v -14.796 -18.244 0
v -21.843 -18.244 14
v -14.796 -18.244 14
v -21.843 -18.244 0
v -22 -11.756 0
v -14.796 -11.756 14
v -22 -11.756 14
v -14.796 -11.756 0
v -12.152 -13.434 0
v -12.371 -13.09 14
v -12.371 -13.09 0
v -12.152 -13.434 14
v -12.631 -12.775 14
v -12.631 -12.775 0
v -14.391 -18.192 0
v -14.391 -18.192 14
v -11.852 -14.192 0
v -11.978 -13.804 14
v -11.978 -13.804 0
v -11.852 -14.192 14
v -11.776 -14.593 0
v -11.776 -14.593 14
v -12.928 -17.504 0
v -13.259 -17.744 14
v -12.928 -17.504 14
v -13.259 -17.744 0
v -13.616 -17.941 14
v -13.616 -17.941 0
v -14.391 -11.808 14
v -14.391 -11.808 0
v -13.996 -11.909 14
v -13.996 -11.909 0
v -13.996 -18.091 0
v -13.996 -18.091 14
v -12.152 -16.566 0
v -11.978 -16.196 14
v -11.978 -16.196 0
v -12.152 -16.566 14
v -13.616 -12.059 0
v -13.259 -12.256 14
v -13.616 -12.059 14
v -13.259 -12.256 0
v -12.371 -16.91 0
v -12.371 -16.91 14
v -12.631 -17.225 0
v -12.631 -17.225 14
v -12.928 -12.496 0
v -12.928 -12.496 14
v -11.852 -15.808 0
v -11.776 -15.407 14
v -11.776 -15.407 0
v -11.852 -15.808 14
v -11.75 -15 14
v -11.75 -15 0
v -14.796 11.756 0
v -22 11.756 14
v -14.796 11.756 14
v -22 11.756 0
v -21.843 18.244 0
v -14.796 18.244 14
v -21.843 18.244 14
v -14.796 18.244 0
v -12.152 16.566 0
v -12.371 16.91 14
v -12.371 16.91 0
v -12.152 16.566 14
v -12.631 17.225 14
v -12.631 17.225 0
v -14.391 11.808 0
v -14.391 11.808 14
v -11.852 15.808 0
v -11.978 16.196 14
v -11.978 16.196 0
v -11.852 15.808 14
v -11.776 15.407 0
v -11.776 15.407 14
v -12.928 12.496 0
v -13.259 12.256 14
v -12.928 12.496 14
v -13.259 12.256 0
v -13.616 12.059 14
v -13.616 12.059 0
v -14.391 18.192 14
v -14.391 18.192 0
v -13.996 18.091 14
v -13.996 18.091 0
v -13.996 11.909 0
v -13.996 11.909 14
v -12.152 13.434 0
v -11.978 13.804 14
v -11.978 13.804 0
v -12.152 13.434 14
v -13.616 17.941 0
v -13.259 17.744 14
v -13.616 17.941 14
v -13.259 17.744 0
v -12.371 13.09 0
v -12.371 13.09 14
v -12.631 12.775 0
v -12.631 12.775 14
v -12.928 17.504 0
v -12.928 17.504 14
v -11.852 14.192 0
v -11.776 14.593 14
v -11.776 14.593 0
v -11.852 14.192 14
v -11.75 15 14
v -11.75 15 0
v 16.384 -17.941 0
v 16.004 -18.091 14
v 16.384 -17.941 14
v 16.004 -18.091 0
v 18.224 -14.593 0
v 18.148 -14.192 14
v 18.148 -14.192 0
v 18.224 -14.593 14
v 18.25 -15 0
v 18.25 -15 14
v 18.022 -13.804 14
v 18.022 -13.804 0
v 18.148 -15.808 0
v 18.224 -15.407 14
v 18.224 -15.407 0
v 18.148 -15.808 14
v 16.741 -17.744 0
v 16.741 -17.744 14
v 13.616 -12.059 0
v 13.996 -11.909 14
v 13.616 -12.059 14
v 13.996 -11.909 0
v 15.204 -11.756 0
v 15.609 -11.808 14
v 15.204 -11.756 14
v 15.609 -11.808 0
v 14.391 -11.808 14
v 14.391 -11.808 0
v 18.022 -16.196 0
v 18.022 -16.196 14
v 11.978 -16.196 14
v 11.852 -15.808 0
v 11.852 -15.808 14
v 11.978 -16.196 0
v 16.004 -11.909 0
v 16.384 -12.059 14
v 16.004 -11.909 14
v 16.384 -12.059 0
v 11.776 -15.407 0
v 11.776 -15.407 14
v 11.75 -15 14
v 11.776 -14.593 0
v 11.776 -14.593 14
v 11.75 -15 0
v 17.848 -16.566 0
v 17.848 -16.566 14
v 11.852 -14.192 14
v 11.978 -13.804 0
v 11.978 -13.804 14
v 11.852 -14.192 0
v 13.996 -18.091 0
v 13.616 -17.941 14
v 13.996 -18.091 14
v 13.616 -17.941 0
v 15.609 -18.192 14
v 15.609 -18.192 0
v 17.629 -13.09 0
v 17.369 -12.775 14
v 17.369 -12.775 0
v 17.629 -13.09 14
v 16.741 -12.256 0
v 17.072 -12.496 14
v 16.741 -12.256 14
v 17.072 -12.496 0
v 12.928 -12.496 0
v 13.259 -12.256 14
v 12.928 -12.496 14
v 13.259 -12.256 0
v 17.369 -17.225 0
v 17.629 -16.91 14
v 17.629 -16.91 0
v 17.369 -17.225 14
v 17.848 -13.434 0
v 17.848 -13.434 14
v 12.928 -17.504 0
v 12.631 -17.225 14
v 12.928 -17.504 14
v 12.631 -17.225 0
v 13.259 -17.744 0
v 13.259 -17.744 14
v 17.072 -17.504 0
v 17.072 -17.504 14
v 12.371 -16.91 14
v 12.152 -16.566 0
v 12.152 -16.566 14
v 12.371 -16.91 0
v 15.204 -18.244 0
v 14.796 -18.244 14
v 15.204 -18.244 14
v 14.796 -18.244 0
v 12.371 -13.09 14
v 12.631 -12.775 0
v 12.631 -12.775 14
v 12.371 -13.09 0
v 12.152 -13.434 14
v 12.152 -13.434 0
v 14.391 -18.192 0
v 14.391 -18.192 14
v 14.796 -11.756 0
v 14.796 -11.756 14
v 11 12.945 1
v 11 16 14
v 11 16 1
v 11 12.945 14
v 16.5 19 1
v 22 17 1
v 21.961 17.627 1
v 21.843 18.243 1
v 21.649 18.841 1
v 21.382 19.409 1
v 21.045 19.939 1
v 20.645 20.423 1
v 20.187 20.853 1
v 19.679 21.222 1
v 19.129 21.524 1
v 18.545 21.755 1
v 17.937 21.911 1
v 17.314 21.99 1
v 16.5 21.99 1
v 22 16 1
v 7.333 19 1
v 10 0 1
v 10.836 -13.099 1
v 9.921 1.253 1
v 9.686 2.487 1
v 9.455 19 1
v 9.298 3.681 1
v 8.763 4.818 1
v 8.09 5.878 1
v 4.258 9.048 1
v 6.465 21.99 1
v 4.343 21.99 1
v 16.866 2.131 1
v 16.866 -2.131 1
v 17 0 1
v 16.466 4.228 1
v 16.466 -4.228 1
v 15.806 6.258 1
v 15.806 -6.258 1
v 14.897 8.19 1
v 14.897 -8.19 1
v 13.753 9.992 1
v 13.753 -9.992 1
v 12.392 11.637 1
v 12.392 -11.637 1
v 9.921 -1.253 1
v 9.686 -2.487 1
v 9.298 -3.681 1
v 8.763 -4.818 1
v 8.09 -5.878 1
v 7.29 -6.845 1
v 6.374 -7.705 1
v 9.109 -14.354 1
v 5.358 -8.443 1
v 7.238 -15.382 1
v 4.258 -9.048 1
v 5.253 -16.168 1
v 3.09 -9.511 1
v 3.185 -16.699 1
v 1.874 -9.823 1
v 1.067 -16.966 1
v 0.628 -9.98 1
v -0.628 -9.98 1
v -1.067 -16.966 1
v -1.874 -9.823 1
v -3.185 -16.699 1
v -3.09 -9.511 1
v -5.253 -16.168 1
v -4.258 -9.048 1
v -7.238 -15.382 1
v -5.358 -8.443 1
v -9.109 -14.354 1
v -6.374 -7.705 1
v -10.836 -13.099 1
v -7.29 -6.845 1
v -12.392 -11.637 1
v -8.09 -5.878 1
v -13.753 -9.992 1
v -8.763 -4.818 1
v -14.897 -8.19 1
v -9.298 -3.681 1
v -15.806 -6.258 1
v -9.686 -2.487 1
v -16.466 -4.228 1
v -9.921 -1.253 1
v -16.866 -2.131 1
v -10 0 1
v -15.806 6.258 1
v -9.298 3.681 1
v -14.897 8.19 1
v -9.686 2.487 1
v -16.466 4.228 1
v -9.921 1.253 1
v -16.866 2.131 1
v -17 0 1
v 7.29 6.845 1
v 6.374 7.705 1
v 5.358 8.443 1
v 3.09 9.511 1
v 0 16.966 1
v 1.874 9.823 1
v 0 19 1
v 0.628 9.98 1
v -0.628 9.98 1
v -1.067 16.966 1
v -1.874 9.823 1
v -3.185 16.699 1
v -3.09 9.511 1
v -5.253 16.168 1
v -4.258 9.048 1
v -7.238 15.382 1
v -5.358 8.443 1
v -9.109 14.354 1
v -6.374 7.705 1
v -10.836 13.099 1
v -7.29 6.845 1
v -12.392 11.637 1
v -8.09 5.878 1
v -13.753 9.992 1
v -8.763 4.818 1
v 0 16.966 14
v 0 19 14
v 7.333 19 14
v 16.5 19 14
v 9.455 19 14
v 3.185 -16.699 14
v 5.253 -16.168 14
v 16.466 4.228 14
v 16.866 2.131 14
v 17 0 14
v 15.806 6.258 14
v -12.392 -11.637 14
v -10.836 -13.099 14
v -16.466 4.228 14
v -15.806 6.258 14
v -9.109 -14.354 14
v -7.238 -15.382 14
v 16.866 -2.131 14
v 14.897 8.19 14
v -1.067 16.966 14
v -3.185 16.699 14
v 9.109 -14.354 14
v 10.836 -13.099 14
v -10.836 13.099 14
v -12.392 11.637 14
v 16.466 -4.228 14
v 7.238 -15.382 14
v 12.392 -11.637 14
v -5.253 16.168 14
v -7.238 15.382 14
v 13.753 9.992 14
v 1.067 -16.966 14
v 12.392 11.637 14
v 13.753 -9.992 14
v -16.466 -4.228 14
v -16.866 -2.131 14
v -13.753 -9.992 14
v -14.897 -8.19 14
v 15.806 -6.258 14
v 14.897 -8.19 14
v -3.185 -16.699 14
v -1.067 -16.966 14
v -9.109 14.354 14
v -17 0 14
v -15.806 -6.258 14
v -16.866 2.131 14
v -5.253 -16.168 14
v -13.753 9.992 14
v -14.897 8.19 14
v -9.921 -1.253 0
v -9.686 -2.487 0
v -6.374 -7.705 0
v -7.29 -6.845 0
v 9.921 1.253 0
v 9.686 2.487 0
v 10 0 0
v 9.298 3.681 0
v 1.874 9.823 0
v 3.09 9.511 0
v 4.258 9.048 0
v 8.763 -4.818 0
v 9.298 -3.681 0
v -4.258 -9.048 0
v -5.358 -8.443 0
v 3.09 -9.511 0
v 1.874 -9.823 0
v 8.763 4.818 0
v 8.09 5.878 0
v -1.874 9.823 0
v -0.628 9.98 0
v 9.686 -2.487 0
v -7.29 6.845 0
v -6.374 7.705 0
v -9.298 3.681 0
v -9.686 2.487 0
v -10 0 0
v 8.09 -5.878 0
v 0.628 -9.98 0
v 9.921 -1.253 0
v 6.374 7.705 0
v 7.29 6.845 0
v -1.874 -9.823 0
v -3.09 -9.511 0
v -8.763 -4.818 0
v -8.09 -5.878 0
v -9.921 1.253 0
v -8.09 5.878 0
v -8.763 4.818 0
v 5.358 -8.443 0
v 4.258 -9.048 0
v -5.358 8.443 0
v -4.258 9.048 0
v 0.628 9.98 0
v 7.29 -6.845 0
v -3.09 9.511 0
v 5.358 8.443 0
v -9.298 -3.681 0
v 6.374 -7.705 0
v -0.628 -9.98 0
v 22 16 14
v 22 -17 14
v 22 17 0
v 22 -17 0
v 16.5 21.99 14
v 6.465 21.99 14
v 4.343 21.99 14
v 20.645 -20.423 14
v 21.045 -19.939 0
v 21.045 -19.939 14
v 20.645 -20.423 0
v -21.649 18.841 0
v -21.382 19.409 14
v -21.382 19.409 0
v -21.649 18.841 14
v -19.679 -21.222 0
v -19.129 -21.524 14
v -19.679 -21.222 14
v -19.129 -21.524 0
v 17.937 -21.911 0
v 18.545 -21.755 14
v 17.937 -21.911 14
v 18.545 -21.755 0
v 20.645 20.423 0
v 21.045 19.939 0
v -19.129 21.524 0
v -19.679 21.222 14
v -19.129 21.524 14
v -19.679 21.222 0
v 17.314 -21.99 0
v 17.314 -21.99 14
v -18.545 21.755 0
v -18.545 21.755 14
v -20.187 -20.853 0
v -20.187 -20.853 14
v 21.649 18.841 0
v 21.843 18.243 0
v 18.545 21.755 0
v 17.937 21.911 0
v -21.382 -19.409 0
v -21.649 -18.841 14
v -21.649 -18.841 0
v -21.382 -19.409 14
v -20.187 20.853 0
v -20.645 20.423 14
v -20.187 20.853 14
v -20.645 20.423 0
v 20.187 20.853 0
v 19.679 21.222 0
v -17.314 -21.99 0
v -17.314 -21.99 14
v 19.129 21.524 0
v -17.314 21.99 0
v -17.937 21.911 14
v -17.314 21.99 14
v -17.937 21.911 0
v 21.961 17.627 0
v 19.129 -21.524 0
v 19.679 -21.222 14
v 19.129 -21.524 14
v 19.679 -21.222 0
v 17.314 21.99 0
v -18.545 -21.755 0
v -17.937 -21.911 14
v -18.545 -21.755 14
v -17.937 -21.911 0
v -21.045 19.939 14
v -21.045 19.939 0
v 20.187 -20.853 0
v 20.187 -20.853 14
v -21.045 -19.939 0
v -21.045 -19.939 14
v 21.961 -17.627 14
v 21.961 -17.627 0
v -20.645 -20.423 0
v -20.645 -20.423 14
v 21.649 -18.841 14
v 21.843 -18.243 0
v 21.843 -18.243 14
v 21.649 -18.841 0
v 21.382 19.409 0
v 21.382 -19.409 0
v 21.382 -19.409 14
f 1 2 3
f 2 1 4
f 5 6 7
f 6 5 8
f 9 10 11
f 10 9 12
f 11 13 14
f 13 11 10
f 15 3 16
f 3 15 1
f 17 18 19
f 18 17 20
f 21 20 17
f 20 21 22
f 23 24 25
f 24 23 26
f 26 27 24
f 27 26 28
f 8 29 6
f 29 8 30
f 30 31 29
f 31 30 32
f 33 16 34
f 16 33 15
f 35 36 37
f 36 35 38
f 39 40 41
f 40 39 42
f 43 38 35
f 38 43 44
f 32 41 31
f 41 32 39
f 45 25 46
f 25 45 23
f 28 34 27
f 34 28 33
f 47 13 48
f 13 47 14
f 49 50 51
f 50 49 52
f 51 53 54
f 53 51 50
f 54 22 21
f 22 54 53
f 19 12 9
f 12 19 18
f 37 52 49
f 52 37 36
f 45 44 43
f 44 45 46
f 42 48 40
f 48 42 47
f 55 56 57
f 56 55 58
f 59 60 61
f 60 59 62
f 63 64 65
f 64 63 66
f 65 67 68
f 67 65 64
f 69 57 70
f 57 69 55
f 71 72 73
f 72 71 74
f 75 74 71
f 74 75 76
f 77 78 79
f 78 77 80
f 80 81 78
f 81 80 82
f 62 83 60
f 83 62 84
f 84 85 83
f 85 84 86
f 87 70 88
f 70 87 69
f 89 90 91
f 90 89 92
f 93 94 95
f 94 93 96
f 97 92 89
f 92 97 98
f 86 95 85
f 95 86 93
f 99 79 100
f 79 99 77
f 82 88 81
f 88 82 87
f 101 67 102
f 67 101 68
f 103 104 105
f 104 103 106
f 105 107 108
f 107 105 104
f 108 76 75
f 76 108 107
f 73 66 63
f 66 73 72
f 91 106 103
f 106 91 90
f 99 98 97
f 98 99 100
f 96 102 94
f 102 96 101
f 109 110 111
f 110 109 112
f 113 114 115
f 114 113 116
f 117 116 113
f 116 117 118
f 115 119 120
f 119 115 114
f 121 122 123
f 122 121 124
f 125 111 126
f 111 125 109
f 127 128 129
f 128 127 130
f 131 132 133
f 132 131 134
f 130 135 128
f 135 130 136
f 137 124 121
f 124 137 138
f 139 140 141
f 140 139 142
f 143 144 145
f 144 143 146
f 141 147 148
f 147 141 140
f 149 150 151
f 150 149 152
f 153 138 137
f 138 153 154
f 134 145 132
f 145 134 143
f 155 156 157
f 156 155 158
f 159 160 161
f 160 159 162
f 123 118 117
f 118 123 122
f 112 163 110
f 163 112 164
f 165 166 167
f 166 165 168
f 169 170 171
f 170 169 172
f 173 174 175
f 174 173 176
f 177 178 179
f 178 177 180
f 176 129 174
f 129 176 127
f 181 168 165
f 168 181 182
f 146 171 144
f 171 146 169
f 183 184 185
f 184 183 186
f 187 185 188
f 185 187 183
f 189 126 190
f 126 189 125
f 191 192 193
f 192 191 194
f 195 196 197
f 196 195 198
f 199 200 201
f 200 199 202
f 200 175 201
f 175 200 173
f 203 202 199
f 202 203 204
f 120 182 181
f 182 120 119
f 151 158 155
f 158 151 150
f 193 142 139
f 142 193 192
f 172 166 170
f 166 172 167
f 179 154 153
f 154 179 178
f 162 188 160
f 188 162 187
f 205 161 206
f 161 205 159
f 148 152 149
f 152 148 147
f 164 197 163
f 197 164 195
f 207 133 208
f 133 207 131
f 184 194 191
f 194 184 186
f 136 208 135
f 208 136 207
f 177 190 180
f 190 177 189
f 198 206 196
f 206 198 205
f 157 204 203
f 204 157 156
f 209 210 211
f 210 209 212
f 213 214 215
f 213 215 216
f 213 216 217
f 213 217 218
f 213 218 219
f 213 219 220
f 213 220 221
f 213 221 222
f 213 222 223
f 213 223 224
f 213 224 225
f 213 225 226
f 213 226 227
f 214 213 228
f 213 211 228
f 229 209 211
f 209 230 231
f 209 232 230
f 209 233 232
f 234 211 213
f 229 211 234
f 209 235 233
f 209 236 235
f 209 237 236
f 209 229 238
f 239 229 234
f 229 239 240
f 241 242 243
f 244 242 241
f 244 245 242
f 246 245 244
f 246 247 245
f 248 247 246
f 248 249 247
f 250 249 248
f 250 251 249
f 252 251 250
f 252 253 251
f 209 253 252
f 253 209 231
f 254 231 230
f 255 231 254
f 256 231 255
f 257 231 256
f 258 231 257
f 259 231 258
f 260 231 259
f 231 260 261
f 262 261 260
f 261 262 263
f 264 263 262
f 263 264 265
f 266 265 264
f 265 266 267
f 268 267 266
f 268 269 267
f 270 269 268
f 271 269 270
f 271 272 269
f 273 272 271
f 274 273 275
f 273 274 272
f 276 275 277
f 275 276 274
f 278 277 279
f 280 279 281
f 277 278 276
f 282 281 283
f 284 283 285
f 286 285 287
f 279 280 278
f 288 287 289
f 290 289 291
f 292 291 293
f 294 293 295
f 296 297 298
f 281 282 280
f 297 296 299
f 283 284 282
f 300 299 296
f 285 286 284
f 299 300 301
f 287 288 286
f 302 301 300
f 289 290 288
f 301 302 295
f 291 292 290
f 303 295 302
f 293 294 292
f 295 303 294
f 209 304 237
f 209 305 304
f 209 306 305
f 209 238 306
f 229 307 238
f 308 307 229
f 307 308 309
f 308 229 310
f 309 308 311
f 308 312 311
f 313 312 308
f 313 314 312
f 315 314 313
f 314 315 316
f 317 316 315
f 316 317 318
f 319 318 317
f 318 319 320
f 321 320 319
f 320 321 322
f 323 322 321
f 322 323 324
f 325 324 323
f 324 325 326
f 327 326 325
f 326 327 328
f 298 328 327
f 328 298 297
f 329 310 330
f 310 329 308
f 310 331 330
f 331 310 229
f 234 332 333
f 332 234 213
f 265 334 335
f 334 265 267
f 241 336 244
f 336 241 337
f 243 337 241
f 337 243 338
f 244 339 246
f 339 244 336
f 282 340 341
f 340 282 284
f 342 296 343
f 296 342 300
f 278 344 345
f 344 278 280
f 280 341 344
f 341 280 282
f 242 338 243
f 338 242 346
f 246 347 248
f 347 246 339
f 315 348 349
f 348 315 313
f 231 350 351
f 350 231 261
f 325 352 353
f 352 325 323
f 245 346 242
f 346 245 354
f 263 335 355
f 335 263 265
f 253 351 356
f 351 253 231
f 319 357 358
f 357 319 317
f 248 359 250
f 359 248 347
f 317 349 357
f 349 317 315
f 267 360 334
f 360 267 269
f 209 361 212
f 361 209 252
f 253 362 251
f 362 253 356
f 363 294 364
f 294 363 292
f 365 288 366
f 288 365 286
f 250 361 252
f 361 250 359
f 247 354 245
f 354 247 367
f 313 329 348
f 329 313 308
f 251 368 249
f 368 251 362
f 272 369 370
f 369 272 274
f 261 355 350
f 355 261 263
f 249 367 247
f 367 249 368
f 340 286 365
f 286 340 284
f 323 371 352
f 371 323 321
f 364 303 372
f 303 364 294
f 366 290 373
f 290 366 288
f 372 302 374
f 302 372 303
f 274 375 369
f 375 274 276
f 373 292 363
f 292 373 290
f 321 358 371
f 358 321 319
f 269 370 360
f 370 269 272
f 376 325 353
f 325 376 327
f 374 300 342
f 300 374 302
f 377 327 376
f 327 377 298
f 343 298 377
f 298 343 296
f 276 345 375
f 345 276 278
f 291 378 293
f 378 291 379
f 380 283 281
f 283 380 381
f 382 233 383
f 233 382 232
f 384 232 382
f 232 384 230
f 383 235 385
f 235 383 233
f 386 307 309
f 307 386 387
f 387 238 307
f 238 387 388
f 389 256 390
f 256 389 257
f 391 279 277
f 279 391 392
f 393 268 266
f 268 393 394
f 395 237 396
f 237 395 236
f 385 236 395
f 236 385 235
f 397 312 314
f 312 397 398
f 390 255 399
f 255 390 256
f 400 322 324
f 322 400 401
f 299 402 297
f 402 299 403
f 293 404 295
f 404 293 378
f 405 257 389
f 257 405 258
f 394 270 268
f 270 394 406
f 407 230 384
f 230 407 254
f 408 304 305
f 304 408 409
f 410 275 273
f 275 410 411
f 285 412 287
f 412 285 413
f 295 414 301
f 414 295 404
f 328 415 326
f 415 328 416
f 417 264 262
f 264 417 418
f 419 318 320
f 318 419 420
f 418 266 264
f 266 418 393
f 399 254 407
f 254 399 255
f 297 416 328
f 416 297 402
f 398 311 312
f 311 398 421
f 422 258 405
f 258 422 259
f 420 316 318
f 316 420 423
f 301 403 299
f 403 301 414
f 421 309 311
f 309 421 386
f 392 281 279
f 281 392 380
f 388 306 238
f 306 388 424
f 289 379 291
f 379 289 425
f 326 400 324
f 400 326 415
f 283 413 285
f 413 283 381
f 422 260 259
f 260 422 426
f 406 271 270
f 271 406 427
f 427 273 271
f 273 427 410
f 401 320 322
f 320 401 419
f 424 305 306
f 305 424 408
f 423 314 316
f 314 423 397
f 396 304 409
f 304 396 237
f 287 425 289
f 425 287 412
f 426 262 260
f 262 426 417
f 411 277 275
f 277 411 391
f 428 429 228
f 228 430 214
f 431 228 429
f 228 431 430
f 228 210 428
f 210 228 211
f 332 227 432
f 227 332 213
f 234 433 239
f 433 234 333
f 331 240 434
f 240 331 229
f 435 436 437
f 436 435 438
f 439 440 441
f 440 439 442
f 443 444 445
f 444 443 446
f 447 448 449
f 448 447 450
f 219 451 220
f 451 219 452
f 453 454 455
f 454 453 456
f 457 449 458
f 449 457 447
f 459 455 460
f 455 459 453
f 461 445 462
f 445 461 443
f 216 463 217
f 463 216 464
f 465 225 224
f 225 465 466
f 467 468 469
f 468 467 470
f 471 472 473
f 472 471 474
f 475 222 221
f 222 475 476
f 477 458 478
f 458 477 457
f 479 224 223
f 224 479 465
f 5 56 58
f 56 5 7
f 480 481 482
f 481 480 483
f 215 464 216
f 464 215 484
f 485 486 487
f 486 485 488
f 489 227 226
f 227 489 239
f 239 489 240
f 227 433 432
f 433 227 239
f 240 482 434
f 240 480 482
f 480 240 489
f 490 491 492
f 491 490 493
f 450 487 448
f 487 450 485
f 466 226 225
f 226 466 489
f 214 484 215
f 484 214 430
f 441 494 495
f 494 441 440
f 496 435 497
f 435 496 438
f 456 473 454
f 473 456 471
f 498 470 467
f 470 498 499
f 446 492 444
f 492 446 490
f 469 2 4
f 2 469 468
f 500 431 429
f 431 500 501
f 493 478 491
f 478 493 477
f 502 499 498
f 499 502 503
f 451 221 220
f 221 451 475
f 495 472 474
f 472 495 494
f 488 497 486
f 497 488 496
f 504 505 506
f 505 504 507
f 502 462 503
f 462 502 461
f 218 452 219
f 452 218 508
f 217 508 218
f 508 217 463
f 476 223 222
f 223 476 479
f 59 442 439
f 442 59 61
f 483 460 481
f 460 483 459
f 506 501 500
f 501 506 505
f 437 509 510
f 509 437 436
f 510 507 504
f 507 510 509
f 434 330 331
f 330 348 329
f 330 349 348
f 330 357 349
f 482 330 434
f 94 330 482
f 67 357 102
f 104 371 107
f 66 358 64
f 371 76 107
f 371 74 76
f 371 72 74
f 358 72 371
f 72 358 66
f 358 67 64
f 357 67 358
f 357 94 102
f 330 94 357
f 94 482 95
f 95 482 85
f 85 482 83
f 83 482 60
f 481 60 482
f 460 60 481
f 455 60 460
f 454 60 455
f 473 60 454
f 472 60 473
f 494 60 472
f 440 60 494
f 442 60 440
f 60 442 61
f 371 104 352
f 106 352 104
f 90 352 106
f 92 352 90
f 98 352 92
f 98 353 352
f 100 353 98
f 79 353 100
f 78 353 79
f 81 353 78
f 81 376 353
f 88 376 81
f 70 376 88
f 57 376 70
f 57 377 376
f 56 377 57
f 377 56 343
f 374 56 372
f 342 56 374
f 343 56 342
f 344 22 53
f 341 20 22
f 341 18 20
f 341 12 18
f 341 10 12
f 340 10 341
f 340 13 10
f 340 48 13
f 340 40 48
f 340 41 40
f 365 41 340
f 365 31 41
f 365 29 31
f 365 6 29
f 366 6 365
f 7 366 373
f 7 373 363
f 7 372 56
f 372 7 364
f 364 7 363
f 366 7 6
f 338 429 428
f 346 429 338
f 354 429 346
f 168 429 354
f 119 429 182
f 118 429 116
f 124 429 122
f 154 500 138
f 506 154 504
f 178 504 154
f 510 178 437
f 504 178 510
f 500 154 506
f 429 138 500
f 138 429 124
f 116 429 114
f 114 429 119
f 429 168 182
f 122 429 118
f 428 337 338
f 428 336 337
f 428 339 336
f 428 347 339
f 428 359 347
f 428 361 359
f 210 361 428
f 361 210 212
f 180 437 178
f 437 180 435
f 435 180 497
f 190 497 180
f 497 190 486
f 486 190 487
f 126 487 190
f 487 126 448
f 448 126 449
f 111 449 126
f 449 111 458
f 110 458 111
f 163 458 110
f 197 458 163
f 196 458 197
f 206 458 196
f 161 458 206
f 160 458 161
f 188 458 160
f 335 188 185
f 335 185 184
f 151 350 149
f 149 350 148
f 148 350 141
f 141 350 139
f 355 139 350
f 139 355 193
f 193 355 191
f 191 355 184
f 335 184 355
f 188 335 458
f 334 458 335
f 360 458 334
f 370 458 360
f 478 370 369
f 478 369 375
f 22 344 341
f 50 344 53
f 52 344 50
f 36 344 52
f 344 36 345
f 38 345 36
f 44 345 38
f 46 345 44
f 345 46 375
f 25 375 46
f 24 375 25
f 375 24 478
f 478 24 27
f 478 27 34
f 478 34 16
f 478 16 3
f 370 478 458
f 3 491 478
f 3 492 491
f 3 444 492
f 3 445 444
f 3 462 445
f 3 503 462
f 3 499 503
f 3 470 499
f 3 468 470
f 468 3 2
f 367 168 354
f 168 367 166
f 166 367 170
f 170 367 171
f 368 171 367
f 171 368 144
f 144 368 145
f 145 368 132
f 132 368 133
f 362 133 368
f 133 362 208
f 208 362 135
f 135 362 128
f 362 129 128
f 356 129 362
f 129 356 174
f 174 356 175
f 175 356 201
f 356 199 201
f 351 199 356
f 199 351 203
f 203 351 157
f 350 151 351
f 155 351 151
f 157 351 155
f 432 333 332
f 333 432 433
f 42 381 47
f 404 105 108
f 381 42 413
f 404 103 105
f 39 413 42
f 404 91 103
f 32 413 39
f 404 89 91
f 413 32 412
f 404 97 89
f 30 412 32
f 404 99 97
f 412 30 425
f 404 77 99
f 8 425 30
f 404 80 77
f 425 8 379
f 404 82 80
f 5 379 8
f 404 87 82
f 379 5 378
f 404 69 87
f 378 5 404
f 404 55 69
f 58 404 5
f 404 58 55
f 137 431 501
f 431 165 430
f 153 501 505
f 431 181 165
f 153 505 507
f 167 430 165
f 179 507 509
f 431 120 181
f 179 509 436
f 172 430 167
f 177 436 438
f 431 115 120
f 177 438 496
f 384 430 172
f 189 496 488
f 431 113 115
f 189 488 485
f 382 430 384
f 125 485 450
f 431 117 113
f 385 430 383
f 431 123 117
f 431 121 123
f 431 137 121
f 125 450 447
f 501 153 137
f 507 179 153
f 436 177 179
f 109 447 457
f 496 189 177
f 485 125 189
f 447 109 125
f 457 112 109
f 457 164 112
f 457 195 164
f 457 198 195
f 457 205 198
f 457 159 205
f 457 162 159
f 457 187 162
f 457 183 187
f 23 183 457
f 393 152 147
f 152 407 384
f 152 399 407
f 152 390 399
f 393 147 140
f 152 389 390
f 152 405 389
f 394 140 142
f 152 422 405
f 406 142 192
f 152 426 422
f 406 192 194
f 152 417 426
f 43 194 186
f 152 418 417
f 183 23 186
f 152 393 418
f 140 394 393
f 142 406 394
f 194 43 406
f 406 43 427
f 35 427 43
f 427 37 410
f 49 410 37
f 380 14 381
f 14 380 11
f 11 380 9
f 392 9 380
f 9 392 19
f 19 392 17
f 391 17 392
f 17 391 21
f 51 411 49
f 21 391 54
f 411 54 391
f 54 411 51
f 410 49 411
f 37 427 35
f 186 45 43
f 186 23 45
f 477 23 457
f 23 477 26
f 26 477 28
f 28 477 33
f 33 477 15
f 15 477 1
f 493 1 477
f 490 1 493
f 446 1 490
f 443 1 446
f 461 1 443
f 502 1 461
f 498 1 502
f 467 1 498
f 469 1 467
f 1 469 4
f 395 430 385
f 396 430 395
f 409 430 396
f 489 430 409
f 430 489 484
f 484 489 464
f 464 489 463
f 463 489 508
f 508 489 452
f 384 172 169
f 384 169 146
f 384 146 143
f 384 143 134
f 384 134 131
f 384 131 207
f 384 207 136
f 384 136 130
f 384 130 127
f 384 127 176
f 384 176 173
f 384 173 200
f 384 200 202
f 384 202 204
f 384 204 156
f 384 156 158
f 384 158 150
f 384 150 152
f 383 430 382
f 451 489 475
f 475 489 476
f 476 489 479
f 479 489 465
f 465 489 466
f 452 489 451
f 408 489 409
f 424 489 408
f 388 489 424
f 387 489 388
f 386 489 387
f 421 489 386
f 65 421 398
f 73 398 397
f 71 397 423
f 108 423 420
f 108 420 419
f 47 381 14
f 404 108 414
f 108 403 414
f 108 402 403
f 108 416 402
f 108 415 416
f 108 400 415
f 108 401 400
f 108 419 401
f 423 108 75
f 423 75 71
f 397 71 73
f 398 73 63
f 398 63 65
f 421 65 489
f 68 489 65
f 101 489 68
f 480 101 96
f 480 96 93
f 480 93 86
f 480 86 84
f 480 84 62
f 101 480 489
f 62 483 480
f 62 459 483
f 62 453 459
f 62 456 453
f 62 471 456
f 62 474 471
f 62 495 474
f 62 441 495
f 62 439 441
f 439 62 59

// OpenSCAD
$fn = 50;


difference() {
	union() {
		translate(v = [0, 0, 0]) {
			rotate(a = [0, 0, 0]) {
				hull() {
					translate(v = [-17.0000000000, 17.0000000000, 0]) {
						rotate(a = [0, 0, 0]) {
							translate(v = [0, 0, 0]) {
								rotate(a = [0, 0, 0]) {
									cylinder(h = 14, r = 5);
								}
							}
						}
					}
					translate(v = [17.0000000000, 17.0000000000, 0]) {
						rotate(a = [0, 0, 0]) {
							translate(v = [0, 0, 0]) {
								rotate(a = [0, 0, 0]) {
									cylinder(h = 14, r = 5);
								}
							}
						}
					}
					translate(v = [-17.0000000000, -17.0000000000, 0]) {
						rotate(a = [0, 0, 0]) {
							translate(v = [0, 0, 0]) {
								rotate(a = [0, 0, 0]) {
									cylinder(h = 14, r = 5);
								}
							}
						}
					}
					translate(v = [17.0000000000, -17.0000000000, 0]) {
						rotate(a = [0, 0, 0]) {
							translate(v = [0, 0, 0]) {
								rotate(a = [0, 0, 0]) {
									cylinder(h = 14, r = 5);
								}
							}
						}
					}
				}
			}
		}
	}
	union() {
		translate(v = [-22.5000000000, -15.0000000000, -125]) {
			rotate(a = [0, 0, 0]) {
				hull() {
					translate(v = [7.5000000000, 0, 0]) {
						rotate(a = [0, 0, 0]) {
							translate(v = [0, 0, 0]) {
								rotate(a = [0, 0, 0]) {
									cylinder(h = 250, r = 3.2500000000);
								}
							}
						}
					}
					translate(v = [-7.5000000000, 0, 0]) {
						rotate(a = [0, 0, 0]) {
							translate(v = [0, 0, 0]) {
								rotate(a = [0, 0, 0]) {
									cylinder(h = 250, r = 3.2500000000);
								}
							}
						}
					}
				}
			}
		}
		translate(v = [-22.5000000000, 15.0000000000, -125]) {
			rotate(a = [0, 0, 0]) {
				hull() {
					translate(v = [7.5000000000, 0, 0]) {
						rotate(a = [0, 0, 0]) {
							translate(v = [0, 0, 0]) {
								rotate(a = [0, 0, 0]) {
									cylinder(h = 250, r = 3.2500000000);
								}
							}
						}
					}
					translate(v = [-7.5000000000, 0, 0]) {
						rotate(a = [0, 0, 0]) {
							translate(v = [0, 0, 0]) {
								rotate(a = [0, 0, 0]) {
									cylinder(h = 250, r = 3.2500000000);
								}
							}
						}
					}
				}
			}
		}
		translate(v = [15.0000000000, -15.0000000000, -125.0000000000]) {
			rotate(a = [0, 0, 0]) {
				cylinder(h = 250, r = 3.2500000000);
			}
		}
		translate(v = [0.0000000000, 11.0000000000, 1.0000000000]) {
			rotate(a = [0, 0, 0]) {
				cube(size = [11, 8, 16]);
			}
		}
		translate(v = [0, 0, 1.0000000000]) {
			rotate(a = [0, 0, 0]) {
				cylinder(h = 16, r = 17.0000000000);
			}
		}
		translate(v = [0, 0, -7.0000000000]) {
			rotate(a = [0, 0, 0]) {
				cylinder(h = 14, r = 10.0000000000);
			}
		}
		translate(v = [0.0000000000, 16.0000000000, 1]) {
			rotate(a = [0, 0, 0]) {
				cube(size = [22.0000000000, 3, 16]);
			}
		}
		translate(v = [16.5000000000, 16.0000000000, 1]) {
			rotate(a = [0, 0, 0]) {
				cube(size = [5.5000000000, 6, 16]);
			}
		}
		translate(v = [3.5833333333, 22.7500000000, 1]) {
			rotate(a = [0, 0, -45]) {
				cube(size = [7.5000000000, 1.5000000000, 16]);
			}
		}
	}
}
